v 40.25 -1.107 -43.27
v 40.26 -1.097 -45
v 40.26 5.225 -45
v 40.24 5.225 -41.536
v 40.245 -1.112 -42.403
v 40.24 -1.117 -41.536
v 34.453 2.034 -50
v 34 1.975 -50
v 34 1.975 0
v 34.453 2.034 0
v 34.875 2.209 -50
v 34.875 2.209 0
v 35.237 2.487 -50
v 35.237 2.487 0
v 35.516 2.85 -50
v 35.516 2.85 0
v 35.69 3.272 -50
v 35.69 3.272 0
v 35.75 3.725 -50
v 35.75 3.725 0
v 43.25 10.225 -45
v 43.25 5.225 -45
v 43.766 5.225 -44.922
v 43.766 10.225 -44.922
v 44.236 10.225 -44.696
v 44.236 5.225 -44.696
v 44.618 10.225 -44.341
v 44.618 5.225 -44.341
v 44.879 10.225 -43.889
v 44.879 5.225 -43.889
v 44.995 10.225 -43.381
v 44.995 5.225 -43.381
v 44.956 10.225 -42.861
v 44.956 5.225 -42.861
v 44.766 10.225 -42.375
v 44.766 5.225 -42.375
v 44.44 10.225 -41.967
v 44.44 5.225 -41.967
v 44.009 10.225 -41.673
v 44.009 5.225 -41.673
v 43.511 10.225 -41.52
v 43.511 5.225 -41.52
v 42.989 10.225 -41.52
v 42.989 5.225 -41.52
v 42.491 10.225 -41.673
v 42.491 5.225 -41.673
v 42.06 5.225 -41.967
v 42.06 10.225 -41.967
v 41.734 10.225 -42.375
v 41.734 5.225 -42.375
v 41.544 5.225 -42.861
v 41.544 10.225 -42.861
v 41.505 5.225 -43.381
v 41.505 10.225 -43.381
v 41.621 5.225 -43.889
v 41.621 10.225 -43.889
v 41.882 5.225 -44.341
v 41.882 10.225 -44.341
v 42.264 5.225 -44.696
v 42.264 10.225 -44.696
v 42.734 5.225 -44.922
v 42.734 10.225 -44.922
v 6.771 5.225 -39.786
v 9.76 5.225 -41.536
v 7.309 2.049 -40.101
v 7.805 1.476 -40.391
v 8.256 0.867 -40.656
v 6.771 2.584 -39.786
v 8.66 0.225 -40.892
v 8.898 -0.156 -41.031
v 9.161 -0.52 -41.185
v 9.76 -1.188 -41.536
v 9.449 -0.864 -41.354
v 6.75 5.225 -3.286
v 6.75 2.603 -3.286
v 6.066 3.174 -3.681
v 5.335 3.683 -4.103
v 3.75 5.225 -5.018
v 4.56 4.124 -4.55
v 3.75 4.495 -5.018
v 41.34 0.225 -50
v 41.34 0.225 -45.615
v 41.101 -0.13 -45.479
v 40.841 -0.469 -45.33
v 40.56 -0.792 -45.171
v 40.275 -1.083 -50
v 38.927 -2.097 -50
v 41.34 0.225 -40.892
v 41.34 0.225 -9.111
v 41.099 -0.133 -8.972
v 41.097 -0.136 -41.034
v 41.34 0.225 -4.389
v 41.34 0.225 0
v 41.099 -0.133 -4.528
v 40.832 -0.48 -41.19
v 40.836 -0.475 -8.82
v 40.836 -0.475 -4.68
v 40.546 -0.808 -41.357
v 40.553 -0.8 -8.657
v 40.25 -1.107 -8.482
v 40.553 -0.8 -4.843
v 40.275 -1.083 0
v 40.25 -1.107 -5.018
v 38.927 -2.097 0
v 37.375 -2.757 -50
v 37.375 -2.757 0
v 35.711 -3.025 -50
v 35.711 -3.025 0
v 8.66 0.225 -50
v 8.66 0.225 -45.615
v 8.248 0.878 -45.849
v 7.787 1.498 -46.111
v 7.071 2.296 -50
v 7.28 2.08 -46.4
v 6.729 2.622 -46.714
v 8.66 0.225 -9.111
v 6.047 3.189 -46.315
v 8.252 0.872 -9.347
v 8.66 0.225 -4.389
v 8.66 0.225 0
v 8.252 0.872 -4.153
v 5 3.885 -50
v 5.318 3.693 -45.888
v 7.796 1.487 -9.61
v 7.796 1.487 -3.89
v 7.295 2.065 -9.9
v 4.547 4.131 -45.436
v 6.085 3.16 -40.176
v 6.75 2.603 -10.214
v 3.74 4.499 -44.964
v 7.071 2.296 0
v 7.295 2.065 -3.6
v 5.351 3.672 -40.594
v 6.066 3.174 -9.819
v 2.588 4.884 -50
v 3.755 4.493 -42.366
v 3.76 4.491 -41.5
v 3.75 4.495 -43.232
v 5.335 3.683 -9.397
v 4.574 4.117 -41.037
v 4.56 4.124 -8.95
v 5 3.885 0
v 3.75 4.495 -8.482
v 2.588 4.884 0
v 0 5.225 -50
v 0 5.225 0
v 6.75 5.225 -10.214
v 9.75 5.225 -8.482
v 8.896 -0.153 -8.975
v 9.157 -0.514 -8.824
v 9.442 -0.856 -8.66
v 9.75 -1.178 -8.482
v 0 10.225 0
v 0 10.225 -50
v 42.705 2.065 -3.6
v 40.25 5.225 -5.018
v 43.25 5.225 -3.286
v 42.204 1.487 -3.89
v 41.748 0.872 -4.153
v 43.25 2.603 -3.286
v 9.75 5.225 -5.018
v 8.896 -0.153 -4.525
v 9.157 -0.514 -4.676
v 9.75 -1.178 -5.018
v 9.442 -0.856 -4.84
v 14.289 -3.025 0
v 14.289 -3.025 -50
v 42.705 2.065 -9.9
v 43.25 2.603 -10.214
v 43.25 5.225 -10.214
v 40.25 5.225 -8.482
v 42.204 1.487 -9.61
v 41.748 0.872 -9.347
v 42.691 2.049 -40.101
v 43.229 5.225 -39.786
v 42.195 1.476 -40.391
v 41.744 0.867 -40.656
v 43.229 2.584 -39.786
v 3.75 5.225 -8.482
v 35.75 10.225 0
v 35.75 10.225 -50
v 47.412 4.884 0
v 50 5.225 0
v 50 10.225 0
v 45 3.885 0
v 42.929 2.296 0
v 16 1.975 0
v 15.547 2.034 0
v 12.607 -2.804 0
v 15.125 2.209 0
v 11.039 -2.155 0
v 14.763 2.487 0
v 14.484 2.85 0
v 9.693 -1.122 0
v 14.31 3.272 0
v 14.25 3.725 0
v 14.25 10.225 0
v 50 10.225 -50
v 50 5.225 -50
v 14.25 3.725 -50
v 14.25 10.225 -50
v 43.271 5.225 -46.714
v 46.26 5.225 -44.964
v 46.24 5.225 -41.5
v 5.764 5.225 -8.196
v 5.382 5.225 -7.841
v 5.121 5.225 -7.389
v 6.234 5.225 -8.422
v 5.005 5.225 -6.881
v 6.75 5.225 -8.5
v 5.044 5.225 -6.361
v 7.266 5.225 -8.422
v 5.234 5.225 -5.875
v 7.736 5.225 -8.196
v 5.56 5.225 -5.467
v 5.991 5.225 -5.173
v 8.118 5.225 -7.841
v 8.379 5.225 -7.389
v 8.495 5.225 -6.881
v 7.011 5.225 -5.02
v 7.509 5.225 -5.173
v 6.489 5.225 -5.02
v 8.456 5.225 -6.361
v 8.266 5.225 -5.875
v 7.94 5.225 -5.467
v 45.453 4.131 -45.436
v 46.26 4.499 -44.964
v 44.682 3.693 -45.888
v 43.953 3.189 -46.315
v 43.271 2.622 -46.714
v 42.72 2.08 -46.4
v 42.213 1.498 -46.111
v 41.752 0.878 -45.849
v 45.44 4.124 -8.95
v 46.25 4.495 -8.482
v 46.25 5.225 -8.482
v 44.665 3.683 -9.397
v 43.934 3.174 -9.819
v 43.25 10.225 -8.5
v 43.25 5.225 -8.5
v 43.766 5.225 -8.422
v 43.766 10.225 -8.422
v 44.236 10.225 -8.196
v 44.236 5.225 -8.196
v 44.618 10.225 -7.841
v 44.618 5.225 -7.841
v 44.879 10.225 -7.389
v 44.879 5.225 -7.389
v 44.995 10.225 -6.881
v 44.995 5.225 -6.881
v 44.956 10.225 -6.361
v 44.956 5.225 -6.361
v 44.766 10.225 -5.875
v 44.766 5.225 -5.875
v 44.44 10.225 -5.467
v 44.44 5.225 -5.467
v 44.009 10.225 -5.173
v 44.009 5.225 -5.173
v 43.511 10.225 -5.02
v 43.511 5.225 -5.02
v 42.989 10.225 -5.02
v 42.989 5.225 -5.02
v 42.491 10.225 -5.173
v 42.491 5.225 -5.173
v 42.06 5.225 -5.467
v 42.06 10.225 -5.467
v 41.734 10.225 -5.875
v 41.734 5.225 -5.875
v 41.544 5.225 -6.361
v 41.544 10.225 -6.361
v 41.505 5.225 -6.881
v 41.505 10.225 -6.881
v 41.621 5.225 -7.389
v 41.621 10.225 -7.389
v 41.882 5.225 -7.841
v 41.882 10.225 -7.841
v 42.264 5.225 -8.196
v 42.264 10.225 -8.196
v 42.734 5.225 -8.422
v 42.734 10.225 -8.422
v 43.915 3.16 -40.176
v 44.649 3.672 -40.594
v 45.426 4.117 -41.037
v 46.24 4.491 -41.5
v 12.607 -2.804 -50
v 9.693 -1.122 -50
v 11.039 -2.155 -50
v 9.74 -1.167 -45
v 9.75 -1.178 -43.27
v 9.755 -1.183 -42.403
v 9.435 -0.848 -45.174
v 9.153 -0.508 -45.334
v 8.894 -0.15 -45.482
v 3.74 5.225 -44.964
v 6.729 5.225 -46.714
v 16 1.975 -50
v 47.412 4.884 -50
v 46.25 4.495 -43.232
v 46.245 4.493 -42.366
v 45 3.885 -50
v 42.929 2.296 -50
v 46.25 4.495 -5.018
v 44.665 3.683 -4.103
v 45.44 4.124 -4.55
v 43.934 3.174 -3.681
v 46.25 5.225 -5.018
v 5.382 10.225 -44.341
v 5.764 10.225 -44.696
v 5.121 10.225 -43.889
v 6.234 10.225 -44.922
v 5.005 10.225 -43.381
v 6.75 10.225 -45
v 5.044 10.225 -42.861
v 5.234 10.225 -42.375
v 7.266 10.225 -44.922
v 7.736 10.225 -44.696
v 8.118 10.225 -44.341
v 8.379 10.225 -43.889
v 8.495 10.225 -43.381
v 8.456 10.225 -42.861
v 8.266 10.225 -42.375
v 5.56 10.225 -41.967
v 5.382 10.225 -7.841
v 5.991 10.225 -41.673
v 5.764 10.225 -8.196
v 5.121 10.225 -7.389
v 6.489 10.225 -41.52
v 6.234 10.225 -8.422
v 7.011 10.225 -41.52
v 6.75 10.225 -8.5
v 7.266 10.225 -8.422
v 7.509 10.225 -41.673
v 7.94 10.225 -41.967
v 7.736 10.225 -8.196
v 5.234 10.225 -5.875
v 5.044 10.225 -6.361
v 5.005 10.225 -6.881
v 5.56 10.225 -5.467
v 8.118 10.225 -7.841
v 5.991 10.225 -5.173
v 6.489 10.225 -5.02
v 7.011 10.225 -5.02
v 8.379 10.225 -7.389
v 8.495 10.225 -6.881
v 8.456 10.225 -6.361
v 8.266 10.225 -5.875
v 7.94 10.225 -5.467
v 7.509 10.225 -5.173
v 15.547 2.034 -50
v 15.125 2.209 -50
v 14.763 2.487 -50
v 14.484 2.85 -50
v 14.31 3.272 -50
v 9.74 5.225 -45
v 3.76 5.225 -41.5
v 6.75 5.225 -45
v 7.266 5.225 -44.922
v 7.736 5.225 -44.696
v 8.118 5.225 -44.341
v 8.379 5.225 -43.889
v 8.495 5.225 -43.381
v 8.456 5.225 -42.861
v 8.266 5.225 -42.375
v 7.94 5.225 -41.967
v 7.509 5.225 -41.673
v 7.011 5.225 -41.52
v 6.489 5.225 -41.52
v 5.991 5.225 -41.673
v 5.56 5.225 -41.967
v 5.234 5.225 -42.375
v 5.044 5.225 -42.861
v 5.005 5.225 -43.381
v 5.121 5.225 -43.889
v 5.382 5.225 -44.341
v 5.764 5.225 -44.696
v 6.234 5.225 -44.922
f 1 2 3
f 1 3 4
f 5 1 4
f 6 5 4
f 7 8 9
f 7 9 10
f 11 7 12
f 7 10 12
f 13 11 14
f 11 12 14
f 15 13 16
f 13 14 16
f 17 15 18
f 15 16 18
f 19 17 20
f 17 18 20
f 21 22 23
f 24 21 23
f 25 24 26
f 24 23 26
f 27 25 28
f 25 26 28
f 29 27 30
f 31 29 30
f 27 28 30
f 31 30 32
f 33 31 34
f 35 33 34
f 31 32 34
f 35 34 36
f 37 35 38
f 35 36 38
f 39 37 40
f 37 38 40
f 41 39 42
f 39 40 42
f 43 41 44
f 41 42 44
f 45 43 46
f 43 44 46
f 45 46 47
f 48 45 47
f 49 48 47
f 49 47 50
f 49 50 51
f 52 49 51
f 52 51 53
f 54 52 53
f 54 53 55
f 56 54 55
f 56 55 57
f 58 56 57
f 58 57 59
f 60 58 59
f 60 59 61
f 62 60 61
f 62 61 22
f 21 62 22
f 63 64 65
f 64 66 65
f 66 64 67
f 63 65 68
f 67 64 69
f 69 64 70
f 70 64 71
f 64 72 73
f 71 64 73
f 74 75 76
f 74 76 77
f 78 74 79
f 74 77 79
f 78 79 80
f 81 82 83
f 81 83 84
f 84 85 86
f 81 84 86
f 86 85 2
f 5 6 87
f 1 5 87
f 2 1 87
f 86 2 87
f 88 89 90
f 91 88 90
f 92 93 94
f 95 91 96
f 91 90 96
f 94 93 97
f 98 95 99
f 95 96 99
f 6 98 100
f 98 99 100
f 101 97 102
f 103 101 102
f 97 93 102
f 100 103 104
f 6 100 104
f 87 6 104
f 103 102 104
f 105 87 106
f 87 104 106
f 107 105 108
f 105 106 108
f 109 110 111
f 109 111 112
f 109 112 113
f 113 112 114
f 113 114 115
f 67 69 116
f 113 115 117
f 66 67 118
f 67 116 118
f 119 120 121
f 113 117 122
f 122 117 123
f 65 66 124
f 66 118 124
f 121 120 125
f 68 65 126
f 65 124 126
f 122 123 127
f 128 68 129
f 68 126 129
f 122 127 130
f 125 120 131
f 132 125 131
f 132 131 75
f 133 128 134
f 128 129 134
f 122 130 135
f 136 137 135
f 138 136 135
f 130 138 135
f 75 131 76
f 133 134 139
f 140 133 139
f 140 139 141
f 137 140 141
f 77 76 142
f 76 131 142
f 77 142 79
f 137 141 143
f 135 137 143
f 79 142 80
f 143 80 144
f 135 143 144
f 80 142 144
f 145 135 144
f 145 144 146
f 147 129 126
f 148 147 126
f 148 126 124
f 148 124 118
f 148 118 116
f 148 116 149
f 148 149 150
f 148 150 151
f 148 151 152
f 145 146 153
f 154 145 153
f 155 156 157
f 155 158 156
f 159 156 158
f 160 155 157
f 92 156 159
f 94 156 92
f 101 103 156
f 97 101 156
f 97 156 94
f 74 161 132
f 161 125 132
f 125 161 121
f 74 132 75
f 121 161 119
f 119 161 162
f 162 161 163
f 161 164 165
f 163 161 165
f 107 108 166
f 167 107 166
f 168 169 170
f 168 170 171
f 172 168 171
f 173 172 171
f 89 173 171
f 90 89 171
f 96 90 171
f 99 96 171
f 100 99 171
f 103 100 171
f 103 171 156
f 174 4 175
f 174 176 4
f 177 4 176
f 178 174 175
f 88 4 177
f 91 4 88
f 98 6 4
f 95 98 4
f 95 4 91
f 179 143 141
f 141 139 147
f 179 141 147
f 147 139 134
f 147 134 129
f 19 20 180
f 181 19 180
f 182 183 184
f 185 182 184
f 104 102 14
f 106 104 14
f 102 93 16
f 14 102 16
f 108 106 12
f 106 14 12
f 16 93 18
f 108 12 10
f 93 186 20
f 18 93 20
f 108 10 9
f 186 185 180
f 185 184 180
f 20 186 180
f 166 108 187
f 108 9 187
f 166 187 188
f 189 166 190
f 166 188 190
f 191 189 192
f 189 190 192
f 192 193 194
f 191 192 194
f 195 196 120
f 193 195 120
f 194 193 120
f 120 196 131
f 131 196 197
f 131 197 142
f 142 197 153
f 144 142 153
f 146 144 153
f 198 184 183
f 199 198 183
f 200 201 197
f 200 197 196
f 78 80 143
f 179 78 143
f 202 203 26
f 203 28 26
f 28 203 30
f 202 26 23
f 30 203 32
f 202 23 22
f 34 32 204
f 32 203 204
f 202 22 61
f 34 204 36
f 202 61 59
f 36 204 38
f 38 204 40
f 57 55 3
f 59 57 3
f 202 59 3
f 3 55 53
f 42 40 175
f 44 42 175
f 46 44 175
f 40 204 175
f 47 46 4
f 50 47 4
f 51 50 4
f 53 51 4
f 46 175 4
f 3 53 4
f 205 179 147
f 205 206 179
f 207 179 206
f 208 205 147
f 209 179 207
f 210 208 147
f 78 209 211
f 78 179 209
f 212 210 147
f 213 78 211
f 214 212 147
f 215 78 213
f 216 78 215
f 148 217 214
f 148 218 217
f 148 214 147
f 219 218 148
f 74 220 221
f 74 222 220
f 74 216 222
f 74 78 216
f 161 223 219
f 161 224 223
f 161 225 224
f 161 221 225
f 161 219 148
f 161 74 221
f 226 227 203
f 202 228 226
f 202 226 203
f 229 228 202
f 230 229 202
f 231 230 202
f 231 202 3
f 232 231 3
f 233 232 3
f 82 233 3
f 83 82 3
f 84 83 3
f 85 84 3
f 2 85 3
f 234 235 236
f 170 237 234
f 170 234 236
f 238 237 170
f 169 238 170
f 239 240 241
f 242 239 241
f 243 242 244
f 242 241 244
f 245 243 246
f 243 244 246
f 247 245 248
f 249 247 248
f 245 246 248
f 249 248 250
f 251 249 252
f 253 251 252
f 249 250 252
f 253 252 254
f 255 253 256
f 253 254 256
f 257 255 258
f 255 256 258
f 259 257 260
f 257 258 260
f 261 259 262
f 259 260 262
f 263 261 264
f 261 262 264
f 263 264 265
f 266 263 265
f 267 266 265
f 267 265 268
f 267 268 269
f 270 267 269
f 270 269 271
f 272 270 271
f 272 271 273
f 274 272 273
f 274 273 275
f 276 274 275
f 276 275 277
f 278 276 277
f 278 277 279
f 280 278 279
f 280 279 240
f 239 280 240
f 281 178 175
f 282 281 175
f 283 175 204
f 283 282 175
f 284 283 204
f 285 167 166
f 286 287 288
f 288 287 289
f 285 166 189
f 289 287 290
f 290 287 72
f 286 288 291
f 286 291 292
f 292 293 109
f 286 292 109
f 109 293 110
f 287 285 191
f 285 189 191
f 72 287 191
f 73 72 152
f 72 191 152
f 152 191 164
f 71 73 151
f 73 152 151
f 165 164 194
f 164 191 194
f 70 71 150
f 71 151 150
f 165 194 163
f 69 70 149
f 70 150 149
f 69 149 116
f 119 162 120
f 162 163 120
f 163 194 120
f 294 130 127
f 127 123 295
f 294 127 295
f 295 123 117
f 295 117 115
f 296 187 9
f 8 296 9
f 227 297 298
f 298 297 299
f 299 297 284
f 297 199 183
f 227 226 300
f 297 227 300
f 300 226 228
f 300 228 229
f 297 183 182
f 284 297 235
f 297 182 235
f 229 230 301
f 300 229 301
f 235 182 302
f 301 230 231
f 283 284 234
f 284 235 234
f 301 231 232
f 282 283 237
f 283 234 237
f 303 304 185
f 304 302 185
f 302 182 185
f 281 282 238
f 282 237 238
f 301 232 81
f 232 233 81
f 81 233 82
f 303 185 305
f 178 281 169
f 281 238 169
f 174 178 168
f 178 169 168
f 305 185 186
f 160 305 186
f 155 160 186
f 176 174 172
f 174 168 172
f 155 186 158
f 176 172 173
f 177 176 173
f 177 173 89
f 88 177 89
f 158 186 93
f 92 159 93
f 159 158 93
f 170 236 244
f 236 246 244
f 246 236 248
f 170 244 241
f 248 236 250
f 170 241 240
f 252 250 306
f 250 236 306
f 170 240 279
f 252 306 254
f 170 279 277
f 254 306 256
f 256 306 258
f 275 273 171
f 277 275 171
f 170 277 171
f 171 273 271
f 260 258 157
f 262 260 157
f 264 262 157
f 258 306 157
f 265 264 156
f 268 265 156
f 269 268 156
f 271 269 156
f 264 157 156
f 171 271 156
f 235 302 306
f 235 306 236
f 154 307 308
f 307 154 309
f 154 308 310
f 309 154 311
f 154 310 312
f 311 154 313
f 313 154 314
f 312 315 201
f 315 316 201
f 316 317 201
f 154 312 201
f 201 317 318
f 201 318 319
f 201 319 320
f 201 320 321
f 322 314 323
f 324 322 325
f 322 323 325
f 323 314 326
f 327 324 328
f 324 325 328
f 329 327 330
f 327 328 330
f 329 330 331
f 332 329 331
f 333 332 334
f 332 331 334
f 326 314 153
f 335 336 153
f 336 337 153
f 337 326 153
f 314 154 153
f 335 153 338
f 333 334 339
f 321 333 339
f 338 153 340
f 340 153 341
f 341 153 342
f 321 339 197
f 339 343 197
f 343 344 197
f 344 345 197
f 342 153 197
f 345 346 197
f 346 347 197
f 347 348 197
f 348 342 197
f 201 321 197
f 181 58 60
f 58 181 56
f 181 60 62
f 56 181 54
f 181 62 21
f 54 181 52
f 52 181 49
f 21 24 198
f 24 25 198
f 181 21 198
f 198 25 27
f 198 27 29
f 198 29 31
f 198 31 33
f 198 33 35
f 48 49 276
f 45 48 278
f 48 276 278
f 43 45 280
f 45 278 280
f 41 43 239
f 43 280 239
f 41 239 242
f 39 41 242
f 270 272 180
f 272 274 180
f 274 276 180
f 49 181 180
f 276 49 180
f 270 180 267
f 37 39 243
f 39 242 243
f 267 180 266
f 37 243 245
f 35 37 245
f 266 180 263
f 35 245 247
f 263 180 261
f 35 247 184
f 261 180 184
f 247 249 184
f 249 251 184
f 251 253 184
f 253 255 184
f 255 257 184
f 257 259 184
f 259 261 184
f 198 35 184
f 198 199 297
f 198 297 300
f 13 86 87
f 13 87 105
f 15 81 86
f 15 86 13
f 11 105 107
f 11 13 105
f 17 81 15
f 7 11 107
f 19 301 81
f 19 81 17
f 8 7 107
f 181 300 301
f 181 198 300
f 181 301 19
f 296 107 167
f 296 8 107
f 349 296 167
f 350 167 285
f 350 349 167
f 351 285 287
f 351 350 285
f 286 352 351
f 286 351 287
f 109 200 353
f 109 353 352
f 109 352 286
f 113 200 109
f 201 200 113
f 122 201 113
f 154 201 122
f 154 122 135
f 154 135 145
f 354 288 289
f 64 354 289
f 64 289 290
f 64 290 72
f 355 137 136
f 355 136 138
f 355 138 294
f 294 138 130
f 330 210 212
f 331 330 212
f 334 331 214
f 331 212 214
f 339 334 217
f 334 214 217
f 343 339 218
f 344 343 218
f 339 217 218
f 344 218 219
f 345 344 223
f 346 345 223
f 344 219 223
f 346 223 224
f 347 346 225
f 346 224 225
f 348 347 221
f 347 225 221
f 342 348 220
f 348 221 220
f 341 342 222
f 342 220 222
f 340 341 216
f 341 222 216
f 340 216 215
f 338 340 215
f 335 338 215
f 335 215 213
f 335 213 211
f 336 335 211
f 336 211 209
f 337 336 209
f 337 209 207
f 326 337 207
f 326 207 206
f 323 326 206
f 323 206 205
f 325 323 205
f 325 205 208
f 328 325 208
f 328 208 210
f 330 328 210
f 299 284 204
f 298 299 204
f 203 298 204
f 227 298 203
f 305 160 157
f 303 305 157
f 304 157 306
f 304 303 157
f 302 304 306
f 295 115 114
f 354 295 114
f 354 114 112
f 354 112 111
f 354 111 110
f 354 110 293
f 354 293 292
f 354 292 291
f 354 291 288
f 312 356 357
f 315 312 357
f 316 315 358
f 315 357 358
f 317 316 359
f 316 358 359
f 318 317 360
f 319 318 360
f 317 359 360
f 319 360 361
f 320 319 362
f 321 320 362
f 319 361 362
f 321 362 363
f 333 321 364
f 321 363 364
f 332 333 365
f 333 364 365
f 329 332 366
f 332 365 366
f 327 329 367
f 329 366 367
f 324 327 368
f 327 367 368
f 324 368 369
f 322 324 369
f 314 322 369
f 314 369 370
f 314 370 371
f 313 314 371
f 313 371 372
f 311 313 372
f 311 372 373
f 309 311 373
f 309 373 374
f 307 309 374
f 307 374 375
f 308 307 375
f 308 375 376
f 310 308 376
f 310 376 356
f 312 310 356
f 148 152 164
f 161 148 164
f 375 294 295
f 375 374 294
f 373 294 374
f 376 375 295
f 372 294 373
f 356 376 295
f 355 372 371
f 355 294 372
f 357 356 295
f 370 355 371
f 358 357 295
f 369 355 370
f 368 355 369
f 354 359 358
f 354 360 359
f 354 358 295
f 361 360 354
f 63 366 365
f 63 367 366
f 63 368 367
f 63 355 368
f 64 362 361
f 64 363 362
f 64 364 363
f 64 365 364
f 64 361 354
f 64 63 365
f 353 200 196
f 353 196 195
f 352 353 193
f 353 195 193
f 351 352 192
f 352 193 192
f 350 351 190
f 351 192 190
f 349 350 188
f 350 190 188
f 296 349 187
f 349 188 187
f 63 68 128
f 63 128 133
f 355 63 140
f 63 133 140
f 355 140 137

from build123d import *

# Parameters (mm, degrees)
BOSS_EXTRUDE1_DEPTH = 50
SKETCH2_R           = 1.75
CUT_EXTRUDE1_DEPTH  = 72.941382389
CUT_EXTRUDE2_DEPTH  = 8.249997


with BuildPart() as part:
    # Sketch1 → Boss-Extrude1 (new body)
    with BuildSketch(Plane.XY):
        with BuildLine():
            Line((50, 10.224622738), (50, 5.224622738))
            ThreePointArc((50, 5.224622738), (45, 3.884876776), (41.339745962, 0.224622738))
            ThreePointArc((41.339745962, 0.224622738), (38.927083678, -2.096523604), (35.710580838, -3.025377262))
            Line((35.710580838, -3.025377262), (14.289419162, -3.025377262))
            ThreePointArc((14.289419162, -3.025377262), (11.039419162, -2.154542386), (8.660254038, 0.224622738))
            ThreePointArc((8.660254038, 0.224622738), (5, 3.884876776), (0, 5.224622738))
            Line((0, 5.224622738), (0, 10.224622738))
            Line((0, 10.224622738), (14.25, 10.224622738))
            Line((14.25, 10.224622738), (14.25, 3.724622738))
            ThreePointArc((14.25, 3.724622738), (14.762563133, 2.487185871), (16, 1.974622738))
            Line((16, 1.974622738), (34, 1.974622738))
            ThreePointArc((34, 1.974622738), (35.237436867, 2.487185871), (35.75, 3.724622738))
            Line((35.75, 3.724622738), (35.75, 10.224622738))
            Line((35.75, 10.224622738), (50, 10.224622738))
        make_face()
    extrude(amount=-BOSS_EXTRUDE1_DEPTH)

    # Sketch2 → Cut-Extrude1 (cut, through all)
    with BuildSketch(Plane.XZ.offset(3.025377262)):
        with Locations(Location((6.75, -43.25, 0), (0, 0, 270))):
            Circle(SKETCH2_R)
        with Locations(Location((43.25, -43.25, 0), (0, 0, 270))):
            Circle(SKETCH2_R)
        with Locations(Location((6.75, -6.75, 0), (0, 0, 270))):
            Circle(SKETCH2_R)
        with Locations(Location((43.25, -6.75, 0), (0, 0, 270))):
            Circle(SKETCH2_R)
    extrude(amount=-CUT_EXTRUDE1_DEPTH, mode=Mode.SUBTRACT)

    # Sketch3 → Cut-Extrude2 (cut)
    with BuildSketch(Plane.XZ.offset(3.025377262)):
        Polygon((9.75, -5.017949192), (6.75, -3.285898385), (3.75, -5.017949192), (3.75, -8.482050808), (6.75, -10.214101615), (9.75, -8.482050808), align=None)
        Polygon((6.770844829, -39.785961101), (3.760476728, -41.499928399), (3.739631899, -44.963967298), (6.729155171, -46.714038899), (9.739523272, -45.000071601), (9.760368101, -41.536032702), align=None)
        Polygon((40.239631899, -41.536032702), (43.229155171, -39.785961101), (46.239523272, -41.499928399), (46.260368101, -44.963967298), (43.270844829, -46.714038899), (40.260476728, -45.000071601), align=None)
        Polygon((40.25, -8.482050808), (40.25, -5.017949192), (43.25, -3.285898385), (46.25, -5.017949192), (46.25, -8.482050808), (43.25, -10.214101615), align=None)
    extrude(amount=-CUT_EXTRUDE2_DEPTH, mode=Mode.SUBTRACT)


solid = part.part
